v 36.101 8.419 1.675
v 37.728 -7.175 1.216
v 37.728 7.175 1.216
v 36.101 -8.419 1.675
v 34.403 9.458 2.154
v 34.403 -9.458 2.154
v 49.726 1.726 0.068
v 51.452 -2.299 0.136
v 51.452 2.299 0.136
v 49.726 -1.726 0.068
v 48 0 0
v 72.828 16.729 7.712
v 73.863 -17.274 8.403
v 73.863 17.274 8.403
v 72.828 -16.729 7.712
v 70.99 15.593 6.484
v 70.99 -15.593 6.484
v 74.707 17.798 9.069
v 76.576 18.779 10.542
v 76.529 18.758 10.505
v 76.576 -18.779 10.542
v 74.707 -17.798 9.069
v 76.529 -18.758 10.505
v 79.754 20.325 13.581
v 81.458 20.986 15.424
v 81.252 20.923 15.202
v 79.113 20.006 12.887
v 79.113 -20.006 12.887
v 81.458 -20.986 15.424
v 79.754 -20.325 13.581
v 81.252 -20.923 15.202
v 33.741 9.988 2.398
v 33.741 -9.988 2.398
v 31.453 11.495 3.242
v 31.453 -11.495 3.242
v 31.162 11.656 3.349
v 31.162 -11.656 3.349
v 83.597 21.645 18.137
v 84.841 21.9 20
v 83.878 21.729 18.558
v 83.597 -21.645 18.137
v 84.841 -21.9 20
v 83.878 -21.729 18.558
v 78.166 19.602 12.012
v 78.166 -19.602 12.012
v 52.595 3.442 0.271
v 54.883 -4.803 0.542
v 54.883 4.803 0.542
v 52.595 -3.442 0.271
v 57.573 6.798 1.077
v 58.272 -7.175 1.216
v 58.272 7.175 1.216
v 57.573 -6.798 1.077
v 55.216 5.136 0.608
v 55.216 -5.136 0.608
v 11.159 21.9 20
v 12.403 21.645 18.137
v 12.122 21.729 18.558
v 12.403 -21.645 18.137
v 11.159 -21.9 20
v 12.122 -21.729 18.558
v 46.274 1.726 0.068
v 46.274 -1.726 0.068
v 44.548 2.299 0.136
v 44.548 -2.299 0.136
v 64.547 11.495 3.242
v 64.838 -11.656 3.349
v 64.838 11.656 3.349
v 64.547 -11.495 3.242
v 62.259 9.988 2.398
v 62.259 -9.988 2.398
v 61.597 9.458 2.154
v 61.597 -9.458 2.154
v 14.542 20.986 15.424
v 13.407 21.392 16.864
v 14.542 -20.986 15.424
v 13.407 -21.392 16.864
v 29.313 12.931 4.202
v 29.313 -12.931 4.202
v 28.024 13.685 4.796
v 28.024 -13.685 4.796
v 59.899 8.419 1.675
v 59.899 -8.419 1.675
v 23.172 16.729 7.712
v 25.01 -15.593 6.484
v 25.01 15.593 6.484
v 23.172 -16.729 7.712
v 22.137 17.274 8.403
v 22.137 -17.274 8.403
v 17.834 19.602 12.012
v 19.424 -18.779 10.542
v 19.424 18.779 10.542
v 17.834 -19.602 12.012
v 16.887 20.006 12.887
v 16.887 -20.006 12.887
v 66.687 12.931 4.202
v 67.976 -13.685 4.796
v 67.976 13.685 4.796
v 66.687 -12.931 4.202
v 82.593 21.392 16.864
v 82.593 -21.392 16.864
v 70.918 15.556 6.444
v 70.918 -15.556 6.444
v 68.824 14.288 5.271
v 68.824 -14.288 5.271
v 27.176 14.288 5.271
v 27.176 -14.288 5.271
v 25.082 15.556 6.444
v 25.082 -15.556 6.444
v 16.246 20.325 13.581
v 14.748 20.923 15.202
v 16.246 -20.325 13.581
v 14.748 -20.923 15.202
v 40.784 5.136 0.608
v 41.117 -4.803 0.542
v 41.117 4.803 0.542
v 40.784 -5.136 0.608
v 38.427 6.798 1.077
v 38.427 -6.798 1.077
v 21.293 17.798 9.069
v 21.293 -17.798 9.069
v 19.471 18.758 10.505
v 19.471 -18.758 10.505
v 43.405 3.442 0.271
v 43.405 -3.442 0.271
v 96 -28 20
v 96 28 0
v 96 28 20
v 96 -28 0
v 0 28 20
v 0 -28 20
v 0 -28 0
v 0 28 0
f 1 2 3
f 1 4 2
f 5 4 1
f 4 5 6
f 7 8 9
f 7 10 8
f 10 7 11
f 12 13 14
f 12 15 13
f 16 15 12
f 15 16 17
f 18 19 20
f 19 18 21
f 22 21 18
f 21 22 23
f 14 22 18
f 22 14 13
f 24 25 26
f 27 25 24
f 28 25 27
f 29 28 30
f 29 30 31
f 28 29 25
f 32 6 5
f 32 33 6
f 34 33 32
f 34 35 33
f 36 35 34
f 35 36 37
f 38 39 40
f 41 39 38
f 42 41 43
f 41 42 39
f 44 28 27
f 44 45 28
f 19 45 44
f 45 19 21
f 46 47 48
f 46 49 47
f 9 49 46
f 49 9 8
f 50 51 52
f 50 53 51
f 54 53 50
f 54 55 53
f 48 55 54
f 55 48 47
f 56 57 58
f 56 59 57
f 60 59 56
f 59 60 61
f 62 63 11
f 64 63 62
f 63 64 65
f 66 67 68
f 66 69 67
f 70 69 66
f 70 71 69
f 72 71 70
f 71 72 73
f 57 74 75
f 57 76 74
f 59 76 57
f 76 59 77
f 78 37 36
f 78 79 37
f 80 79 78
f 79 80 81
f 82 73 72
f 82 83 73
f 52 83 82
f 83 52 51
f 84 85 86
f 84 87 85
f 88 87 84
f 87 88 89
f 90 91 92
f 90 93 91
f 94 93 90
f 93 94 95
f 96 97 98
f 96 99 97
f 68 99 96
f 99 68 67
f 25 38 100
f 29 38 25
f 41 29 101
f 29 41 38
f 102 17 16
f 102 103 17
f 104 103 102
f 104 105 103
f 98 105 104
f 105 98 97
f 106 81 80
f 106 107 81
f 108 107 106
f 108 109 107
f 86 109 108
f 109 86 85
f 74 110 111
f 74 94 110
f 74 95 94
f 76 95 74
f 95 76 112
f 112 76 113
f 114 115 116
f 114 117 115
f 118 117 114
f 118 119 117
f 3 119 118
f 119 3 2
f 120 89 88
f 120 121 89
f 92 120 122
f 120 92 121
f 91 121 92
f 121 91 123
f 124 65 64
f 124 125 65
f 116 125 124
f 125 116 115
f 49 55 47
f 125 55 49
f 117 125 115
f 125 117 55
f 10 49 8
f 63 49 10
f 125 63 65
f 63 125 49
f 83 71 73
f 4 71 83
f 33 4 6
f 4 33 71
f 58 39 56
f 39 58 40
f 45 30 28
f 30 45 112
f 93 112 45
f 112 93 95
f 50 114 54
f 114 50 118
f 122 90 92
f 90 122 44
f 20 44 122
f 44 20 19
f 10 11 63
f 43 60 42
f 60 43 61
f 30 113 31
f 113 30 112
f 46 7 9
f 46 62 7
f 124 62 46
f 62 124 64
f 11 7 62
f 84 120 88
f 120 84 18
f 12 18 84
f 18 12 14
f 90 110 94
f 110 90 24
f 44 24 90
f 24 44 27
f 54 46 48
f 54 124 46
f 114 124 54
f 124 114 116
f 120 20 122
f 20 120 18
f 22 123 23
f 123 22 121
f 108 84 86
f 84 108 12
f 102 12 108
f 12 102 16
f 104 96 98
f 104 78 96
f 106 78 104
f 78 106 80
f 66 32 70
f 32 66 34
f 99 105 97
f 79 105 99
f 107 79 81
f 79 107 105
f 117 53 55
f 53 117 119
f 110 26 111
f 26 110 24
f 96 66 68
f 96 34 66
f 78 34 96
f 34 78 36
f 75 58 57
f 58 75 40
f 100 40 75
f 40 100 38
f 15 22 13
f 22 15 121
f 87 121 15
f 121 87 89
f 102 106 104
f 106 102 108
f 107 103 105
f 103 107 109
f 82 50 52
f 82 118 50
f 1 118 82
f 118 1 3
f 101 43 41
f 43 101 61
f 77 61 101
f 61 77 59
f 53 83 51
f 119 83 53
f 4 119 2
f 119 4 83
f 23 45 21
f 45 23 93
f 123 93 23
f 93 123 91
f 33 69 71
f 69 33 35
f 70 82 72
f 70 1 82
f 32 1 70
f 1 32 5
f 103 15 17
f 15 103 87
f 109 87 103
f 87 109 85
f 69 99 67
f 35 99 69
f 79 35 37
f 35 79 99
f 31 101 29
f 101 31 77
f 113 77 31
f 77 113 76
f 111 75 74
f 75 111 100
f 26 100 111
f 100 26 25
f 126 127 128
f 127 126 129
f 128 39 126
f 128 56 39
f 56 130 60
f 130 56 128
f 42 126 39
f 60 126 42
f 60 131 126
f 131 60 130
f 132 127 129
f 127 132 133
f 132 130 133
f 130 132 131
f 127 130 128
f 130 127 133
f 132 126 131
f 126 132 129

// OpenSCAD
// JBL Clip 5 cradle
// r_w: radius of bottom arc along width axis (left-right), from front image
// r_d: radius of bottom arc along depth axis (front-back), from side image
// Add ~1-2mm clearance to each so the speaker drops in without force

r_w   = 44;   // 42mm measured + 2mm clearance
r_d   = 22;   // 20.6mm measured + ~1.5mm clearance
w     = 96;   // cradle width (86mm spec + 10mm walls)
d     = 56;   // cradle depth (46mm spec + 10mm walls)
h     = 20;   // cradle block height — enough to hold the socket
lip_h = 6;    // front lip height above socket floor
lip_t = 4;    // front lip thickness
$fn   = 80;

module socket() {
    // Intersection of two perpendicular cylindrical bores
    // Both cylinders are oriented so their concave surface faces upward
    intersection() {
        // Cylinder 1: axis runs front-to-back (Y), curves left-to-right
        // Center of cylinder is above the block at height r_w
        translate([w/2, -1, r_w])
            rotate([90, 0, 0])
                cylinder(h=d+2, r=r_w, center=false);

        // Cylinder 2: axis runs left-to-right (X), curves front-to-back
        // Center of cylinder is above the block at height r_d
        translate([-1, d/2, r_d])
            rotate([0, 90, 0])
                cylinder(h=w+2, r=r_d, center=false);
    }
}

module cradle() {
    difference() {
        // Solid base block
        cube([w, d, h]);
        // Subtract the doubly-curved socket from above
        translate([0, 0, h - 14])
            socket();
    }
    // Front lip: prevents speaker sliding forward off the stand
    translate([0, d - lip_t, 0])
        cube([w, lip_t, lip_h]);
}

difference() {
  translate([0, -d/2, 0]) cube([w, d, h]);

  intersection() {
    translate([w/2, (d+2)/2, r_w])
      rotate([90, 0, 0])
      cylinder(h=d+2, r=r_w, center=false);
    translate([-1, 0, r_d])
      rotate([0, 90, 0])
      cylinder(h=w+2, r=r_d, center=false);
  }
}
